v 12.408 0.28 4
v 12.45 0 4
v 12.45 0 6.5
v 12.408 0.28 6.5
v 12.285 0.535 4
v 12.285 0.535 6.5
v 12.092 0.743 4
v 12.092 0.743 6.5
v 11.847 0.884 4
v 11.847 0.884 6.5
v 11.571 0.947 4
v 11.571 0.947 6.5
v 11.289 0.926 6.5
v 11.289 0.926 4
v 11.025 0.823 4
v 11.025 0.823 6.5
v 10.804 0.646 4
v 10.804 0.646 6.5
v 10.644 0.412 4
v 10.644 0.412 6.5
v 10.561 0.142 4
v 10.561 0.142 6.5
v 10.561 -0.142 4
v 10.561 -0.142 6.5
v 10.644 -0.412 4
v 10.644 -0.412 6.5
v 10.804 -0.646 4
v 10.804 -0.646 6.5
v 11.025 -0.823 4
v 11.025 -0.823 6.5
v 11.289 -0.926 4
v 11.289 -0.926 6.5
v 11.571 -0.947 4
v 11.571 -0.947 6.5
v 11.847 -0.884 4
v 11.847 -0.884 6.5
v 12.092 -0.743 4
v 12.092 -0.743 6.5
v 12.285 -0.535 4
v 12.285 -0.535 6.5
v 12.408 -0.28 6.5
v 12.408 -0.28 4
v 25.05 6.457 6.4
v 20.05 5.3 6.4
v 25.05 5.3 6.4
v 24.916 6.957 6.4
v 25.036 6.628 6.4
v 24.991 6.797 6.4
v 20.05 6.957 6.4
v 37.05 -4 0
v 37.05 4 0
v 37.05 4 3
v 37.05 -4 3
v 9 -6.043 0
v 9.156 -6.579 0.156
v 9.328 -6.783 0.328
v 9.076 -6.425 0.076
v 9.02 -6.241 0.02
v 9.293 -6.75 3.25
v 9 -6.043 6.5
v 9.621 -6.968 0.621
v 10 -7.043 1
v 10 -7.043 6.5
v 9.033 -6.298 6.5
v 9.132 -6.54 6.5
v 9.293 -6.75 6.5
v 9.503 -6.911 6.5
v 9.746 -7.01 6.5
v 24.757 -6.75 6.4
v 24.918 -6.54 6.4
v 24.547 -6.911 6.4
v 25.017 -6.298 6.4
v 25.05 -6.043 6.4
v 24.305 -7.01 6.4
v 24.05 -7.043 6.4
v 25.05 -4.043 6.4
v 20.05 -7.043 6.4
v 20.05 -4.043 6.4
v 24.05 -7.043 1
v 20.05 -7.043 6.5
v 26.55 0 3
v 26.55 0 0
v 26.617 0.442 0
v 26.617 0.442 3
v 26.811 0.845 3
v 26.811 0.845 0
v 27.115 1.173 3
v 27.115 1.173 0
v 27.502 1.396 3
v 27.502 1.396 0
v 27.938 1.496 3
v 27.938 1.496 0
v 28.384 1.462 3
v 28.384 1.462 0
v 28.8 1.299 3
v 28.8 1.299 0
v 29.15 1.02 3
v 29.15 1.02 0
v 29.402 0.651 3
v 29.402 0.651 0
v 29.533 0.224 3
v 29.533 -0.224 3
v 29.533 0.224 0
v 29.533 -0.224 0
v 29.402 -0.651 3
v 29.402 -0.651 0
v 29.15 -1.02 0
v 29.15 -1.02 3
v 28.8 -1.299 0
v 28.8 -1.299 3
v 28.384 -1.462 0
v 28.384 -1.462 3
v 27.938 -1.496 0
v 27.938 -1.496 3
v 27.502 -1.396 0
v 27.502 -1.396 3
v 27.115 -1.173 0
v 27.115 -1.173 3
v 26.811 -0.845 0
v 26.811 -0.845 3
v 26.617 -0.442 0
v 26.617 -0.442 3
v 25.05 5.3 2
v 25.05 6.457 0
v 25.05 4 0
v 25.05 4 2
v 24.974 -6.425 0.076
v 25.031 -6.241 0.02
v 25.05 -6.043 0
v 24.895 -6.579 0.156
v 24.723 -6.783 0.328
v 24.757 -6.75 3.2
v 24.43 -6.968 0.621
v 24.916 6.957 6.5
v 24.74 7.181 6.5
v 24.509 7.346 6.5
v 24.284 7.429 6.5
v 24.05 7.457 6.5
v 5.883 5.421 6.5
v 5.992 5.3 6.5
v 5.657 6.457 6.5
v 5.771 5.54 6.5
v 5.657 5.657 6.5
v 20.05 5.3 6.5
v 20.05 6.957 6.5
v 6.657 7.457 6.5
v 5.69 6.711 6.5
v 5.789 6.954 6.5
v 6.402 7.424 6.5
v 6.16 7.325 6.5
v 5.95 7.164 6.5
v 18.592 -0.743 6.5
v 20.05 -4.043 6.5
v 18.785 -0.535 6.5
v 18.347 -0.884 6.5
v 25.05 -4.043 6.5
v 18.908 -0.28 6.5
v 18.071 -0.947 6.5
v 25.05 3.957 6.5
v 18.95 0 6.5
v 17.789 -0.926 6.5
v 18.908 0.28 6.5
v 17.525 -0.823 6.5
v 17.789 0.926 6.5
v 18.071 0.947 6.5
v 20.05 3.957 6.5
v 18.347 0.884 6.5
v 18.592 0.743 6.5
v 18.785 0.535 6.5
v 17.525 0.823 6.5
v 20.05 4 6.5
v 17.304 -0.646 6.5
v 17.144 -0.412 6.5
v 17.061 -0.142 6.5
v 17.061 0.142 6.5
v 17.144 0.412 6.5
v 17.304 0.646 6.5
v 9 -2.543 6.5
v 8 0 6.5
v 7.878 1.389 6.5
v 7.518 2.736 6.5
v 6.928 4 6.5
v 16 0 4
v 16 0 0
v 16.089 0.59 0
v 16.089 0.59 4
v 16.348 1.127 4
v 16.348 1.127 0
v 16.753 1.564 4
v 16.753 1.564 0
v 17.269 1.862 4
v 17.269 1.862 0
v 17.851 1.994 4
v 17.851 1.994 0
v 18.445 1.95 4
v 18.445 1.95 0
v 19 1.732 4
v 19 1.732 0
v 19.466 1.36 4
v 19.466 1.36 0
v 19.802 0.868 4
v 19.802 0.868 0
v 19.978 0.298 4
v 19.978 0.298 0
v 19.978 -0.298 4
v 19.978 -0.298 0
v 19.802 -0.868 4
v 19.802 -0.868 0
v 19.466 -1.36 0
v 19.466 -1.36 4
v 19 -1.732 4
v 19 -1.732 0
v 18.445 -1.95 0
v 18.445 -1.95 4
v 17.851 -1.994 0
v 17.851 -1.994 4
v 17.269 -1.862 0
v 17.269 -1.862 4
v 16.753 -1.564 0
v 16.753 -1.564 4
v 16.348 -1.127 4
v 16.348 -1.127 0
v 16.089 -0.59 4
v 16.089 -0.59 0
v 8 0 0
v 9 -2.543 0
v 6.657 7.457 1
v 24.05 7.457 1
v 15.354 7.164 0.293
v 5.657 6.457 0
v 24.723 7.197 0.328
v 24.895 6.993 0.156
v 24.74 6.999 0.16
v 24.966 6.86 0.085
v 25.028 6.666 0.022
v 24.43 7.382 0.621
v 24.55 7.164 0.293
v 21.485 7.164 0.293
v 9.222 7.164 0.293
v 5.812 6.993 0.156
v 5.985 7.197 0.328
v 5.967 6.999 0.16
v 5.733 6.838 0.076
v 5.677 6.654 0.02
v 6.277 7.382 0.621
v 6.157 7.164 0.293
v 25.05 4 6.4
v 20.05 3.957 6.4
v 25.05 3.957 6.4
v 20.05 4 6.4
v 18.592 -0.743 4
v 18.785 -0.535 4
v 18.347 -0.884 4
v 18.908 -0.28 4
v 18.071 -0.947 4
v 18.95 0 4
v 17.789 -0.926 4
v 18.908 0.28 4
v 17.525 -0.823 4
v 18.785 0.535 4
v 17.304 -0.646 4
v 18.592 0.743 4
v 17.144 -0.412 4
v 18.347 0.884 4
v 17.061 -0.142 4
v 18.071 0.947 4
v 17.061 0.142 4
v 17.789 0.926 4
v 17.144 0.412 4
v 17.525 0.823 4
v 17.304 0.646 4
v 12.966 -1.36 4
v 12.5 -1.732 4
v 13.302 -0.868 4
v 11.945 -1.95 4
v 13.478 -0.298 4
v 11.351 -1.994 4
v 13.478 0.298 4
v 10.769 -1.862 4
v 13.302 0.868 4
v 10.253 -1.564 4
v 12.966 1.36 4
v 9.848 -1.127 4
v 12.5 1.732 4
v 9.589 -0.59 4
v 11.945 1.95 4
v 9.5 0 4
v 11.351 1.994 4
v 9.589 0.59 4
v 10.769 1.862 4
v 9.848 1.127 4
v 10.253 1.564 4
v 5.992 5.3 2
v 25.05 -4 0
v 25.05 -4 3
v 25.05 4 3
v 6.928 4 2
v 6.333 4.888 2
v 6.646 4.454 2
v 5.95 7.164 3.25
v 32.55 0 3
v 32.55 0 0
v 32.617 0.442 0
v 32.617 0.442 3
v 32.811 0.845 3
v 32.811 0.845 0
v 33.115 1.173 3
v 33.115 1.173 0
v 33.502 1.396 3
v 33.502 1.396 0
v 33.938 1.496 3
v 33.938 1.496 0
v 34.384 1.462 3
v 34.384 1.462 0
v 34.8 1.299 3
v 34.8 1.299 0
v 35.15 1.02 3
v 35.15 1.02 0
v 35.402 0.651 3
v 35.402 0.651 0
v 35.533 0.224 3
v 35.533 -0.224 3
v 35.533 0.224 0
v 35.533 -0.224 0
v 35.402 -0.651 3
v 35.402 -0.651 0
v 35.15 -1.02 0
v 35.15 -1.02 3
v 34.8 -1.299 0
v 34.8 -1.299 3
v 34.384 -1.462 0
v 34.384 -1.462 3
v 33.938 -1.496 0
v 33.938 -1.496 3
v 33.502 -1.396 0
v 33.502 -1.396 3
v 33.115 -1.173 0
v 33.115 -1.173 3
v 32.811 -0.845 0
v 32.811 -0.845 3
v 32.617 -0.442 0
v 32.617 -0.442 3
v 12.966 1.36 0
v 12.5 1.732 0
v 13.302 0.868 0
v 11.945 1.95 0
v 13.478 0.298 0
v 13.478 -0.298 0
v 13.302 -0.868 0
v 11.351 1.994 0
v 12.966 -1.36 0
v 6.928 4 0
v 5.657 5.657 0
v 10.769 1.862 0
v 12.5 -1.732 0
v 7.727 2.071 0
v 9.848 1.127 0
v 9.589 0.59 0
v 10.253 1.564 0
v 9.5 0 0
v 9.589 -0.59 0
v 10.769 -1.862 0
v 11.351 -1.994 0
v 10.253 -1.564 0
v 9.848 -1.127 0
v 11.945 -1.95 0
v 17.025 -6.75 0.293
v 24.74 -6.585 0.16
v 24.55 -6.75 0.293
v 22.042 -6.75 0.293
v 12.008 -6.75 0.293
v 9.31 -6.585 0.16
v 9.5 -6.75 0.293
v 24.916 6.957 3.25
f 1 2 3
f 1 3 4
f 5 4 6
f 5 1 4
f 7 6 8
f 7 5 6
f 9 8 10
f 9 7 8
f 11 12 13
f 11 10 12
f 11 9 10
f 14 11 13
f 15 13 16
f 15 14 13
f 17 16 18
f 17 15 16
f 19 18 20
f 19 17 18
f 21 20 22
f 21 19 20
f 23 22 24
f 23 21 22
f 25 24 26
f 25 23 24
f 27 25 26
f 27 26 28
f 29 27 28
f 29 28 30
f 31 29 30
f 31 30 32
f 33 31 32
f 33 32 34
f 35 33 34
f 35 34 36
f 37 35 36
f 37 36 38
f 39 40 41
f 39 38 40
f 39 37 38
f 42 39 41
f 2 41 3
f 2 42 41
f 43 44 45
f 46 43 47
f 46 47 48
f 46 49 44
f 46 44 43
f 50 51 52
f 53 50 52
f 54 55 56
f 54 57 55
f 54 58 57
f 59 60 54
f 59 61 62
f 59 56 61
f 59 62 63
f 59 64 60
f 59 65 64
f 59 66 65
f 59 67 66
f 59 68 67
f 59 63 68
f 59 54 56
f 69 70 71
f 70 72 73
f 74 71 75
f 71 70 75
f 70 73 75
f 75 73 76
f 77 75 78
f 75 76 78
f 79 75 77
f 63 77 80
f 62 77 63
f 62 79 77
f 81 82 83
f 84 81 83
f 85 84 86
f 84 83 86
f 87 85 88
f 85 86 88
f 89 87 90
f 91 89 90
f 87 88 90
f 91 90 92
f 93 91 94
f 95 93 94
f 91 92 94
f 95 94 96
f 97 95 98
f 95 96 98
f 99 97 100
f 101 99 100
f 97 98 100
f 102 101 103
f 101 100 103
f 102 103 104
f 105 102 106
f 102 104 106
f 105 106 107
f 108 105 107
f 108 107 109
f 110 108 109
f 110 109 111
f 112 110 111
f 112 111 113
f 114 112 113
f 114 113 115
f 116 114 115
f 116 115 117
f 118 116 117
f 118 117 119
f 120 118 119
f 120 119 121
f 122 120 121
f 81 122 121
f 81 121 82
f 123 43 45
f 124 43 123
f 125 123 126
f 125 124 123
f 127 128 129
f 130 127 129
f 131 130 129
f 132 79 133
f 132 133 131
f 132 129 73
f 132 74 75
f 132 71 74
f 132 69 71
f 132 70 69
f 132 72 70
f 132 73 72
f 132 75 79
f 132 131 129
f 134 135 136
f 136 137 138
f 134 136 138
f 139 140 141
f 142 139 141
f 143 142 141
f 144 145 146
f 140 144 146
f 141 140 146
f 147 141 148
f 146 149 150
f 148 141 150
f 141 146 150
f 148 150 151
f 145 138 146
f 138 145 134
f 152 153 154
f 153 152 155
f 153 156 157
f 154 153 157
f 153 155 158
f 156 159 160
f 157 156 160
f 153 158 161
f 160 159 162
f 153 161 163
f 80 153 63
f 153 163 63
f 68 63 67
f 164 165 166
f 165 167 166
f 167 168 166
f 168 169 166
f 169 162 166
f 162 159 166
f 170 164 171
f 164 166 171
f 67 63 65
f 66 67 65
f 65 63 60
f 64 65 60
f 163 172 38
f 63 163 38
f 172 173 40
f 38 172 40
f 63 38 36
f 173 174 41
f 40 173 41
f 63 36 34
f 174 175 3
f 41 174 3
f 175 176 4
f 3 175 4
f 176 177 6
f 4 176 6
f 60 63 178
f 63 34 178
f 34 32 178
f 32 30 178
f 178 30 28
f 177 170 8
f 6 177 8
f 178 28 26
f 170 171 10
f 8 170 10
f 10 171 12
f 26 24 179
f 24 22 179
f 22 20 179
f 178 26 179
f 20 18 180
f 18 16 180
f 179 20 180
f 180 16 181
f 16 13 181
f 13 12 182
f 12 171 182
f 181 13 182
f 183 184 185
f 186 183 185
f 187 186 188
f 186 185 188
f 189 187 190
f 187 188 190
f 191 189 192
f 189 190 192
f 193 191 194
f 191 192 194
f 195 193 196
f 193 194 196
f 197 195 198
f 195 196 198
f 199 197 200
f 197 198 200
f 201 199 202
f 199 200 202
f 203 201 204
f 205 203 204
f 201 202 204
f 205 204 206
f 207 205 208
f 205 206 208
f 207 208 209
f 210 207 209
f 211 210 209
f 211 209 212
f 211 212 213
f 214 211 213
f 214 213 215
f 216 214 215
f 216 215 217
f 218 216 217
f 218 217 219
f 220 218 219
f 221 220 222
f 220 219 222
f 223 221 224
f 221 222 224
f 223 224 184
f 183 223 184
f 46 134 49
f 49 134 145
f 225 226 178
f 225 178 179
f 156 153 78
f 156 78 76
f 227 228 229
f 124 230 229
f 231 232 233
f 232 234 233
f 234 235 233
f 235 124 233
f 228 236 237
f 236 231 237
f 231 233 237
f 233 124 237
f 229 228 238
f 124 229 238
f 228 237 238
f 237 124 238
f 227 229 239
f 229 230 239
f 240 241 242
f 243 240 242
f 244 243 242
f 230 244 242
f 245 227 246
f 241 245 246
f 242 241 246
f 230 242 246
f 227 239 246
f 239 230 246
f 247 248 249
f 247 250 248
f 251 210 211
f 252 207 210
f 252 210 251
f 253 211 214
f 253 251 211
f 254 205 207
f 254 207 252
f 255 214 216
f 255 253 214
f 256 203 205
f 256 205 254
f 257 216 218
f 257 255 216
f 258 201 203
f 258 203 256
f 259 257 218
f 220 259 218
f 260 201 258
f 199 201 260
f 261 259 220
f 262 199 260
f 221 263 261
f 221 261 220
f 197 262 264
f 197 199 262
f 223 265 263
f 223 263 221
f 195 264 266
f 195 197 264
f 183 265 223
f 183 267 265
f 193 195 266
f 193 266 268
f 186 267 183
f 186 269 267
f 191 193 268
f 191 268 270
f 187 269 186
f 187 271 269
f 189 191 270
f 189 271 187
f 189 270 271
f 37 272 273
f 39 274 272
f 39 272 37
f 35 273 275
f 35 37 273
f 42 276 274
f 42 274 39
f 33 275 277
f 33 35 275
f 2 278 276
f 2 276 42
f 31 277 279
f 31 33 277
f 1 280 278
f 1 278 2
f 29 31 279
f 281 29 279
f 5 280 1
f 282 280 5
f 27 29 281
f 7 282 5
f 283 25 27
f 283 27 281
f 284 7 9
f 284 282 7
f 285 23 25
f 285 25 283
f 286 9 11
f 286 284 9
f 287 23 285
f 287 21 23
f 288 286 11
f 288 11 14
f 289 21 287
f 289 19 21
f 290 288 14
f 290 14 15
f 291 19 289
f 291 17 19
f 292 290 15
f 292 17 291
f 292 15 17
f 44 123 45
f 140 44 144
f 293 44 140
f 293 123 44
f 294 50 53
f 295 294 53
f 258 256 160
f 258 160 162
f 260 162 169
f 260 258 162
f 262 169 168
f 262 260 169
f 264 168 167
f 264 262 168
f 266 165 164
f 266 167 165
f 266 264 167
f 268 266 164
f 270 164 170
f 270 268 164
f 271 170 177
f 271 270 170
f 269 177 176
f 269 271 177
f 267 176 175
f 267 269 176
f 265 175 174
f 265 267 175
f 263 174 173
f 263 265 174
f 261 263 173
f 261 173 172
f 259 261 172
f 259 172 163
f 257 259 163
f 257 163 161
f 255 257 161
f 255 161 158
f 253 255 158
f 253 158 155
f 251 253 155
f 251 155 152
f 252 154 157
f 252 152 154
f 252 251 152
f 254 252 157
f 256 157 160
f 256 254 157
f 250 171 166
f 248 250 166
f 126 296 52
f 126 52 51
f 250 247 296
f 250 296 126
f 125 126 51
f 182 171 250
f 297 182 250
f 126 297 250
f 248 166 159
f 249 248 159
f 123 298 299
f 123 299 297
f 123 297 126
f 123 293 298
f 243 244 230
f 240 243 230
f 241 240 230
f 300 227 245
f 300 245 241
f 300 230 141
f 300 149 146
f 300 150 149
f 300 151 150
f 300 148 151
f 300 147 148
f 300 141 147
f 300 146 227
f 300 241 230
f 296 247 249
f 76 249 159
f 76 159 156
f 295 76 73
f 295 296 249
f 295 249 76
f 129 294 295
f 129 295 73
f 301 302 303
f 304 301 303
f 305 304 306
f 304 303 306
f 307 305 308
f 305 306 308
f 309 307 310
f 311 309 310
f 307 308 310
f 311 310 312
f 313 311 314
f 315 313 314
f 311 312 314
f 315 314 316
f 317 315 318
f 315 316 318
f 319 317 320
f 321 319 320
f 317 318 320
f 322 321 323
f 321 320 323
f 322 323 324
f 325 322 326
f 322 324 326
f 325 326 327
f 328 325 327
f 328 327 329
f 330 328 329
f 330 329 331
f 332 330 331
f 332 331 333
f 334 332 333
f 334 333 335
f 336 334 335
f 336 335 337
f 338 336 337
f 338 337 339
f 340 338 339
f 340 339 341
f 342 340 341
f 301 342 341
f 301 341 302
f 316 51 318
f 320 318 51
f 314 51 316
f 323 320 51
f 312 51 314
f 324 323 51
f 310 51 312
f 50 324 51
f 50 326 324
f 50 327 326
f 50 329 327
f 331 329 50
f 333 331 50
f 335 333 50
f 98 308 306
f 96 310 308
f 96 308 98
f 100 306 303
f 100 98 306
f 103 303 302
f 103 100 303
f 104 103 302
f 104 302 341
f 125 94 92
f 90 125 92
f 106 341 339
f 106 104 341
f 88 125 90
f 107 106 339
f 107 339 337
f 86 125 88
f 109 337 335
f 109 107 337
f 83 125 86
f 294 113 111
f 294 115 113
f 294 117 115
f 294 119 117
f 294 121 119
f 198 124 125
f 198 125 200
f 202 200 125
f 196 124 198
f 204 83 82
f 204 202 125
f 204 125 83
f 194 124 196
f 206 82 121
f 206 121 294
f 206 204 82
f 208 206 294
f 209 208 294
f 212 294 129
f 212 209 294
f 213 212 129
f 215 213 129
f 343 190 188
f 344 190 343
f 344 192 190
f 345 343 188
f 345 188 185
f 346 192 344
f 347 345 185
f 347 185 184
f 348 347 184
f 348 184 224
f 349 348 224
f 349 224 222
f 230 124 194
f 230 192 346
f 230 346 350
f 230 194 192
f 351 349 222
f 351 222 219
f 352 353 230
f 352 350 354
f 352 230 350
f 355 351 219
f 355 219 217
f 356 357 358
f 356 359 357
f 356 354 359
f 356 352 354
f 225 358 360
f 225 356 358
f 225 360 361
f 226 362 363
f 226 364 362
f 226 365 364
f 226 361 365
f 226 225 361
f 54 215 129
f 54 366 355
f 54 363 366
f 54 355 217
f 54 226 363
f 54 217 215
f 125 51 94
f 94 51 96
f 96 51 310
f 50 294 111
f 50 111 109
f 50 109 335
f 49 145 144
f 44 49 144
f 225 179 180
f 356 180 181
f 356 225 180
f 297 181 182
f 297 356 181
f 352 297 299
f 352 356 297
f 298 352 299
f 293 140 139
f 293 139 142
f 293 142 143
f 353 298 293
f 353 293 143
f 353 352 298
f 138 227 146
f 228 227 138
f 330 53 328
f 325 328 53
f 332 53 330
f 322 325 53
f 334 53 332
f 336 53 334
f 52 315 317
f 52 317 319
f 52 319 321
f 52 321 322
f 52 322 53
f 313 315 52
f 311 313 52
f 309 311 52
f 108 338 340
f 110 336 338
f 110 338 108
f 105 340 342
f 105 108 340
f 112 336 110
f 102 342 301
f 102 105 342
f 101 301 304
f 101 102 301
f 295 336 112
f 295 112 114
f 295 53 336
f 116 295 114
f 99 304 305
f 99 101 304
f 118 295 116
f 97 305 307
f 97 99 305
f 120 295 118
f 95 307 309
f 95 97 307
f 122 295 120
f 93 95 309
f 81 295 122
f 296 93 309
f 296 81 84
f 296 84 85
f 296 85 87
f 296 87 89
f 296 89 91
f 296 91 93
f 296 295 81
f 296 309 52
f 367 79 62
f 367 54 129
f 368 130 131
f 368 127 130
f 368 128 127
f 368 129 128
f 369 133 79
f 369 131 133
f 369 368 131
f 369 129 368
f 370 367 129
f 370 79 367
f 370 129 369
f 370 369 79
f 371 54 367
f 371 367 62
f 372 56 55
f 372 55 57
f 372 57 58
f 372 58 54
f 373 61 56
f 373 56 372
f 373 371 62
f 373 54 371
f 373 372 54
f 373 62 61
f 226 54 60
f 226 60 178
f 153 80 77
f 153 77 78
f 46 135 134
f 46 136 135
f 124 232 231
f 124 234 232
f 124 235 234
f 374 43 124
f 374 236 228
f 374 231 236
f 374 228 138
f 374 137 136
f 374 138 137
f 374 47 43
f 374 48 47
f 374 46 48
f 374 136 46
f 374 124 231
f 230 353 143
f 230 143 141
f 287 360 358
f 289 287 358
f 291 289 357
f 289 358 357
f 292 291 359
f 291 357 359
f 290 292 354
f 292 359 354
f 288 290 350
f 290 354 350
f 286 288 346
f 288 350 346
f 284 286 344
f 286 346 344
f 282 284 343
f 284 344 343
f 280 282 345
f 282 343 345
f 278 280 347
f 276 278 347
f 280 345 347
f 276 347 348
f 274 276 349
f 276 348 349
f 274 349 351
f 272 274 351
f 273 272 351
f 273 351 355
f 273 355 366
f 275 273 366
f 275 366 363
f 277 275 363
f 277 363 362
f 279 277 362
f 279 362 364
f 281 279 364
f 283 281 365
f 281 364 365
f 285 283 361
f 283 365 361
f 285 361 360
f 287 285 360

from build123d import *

# Parameters (mm, degrees)
BOSS_EXTRUDE1_DEPTH      = 2
BOSS_EXTRUDE6_DEPTH      = 4.5
CUT_EXTRUDE6_DEPTH       = 4.5
BOSS_EXTRUDE14_DEPTH     = 2.3
SKETCH32_R               = 3
CUT_EXTRUDE7_DEPTH       = 2.3
SKETCH33_W               = 12.393398282201806
SKETCH33_H               = 2.000000000000001
BOSS_EXTRUDE15_DEPTH     = 1.2
CUT_EXTRUDE8_DEPTH       = 2.4
SKETCH43_R               = 2.5000000000000004
SKETCH43_R_2             = 2.4999999999999982
BOSS_EXTRUDE17_DEPTH     = 1.2
CUT_EXTRUDE11_DEPTH      = 29.420773915365164
CUT_EXTRUDE11_DEPTH_BACK = 29.420773915365164
SKETCH44_R               = 0.9499999999999992
SKETCH44_R_2             = 0.9500000000000008
SKETCH49_R               = 0.7500000000000021
CUT_EXTRUDE13_DEPTH      = 3
FILLET1_R                = 1.5
FILLET3_START            = -1
FILLET3_DEPTH            = 8
FILLET3_START_2          = 5
FILLET3_2_DEPTH          = 21
FILLET3_3_DEPTH          = 8
SKETCH45_R               = 1.9999999999999996
SKETCH45_R_2             = 2.000000000000003
CUT_EXTRUDE15_DEPTH      = 4
FILLET4_R                = 2
BOSS_EXTRUDE18_DEPTH     = 12
SKETCH52_R               = 1.500000000000004
SKETCH52_R_2             = 1.5000000000000007
CUT_EXTRUDE16_DEPTH      = 12


with BuildPart() as part:
    # Sketch3 → Boss-Extrude1 (new body)
    with BuildSketch(Plane.XY):
        with BuildLine():
            Line((8.000000000000002, 0), (8.999999999999995, -2.5431457505076205))
            Line((8.999999999999995, -2.5431457505076205), (8.999999999999995, -7.043145750507605))
            Line((8.999999999999995, -7.043145750507605), (21.50000000000004, -7.043145750507604))
            Line((21.50000000000004, -7.043145750507604), (25.05025253169418, -7.043145750507604))
            Line((25.05025253169418, -7.043145750507604), (25.050252531694177, 7.456854249492383))
            Line((25.050252531694177, 7.456854249492383), (5.656854249492373, 7.456854249492379))
            Line((5.656854249492373, 7.456854249492379), (5.656854249492376, 5.656854249492382))
            ThreePointArc((5.656854249492376, 5.656854249492382), (7.391036260090296, 3.061467458920721), (8.000000000000002, 0))
        make_face()
    extrude(amount=BOSS_EXTRUDE1_DEPTH)

    # Sketch22 → Boss-Extrude6 (add)
    with BuildSketch(Plane.XY.offset(2)):
        with BuildLine():
            Line((5.656854249492378, 7.456854249492383), (21.500000000000025, 7.456854249492383))
            Line((21.500000000000025, 7.456854249492383), (25.050252531694177, 7.456854249492383))
            Line((25.050252531694177, 7.456854249492383), (25.05025253169418, -7.043145750507604))
            Line((25.05025253169418, -7.043145750507604), (8.999999999999995, -7.043145750507605))
            Line((8.999999999999995, -7.043145750507605), (8.999999999999995, -2.5431457505076205))
            Line((8.999999999999995, -2.5431457505076205), (7.999999999999998, 0))
            ThreePointArc((7.999999999999998, 0), (7.391036260090291, 3.061467458920719), (5.656854249492376, 5.656854249492382))
            Line((5.656854249492376, 5.656854249492382), (5.656854249492378, 7.456854249492383))
        make_face()
    extrude(amount=BOSS_EXTRUDE6_DEPTH)

    # Sketch26 → Cut-Extrude6 (cut)
    with BuildSketch(Plane.XY.offset(2)):
        Polygon((18.098080447707712, 5.299999999999999), (2.5300524575164793, 5.299999999999999), (2.5300524575164793, 4), (18.098080447707712, 4), (25.05025253169419, 4.000000000000001), (25.05025253169419, 5.299999999999999), align=None)
    extrude(amount=CUT_EXTRUDE6_DEPTH, mode=Mode.SUBTRACT)


with BuildPart() as body_2:
    # Sketch31 → Boss-Extrude14 (new body)
    with BuildSketch(Plane.XY.offset(6.5)):
        with BuildLine():
            Line((2.4326880657739025, 5.656854247099344), (0.00016454221484158, 5.656854247099344))
            ThreePointArc((0.00016454221484158, 5.656854247099344), (-5.656854248894122, 8.227110743131e-05), (0, -5.656854249492382))
            Line((0, -5.656854249492382), (9.000000000000004, -5.656854249492382))
            Line((9.000000000000004, -5.656854249492382), (8.999999999999995, -7.043145750507605))
            Line((8.999999999999995, -7.043145750507605), (8.999999999999995, -8.543145750507605))
            Line((8.999999999999995, -8.543145750507605), (21.50000000000004, -8.543145750507605))
            Line((21.50000000000004, -8.543145750507605), (21.50000000000004, -7.043145750507605))
            Line((21.50000000000004, -7.043145750507605), (25.05025253169418, -7.043145750507604))
            Line((25.05025253169418, -7.043145750507604), (25.05025253169418, 8.956854249492379))
            Line((25.05025253169418, 8.956854249492379), (5.656854249492376, 8.956854249492379))
            Line((5.656854249492376, 8.956854249492379), (5.656854249492378, 7.456854249492383))
            Line((5.656854249492378, 7.456854249492383), (5.656854249492376, 5.613708498984764))
            Line((5.656854249492376, 5.613708498984764), (2.4326880657739025, 5.656854247099344))
        make_face()
    extrude(amount=BOSS_EXTRUDE14_DEPTH)

    # Sketch32 → Cut-Extrude7 (cut)
    with BuildSketch(Plane.XY.offset(8.799999999999999)):
        Circle(SKETCH32_R)
    extrude(amount=-CUT_EXTRUDE7_DEPTH, mode=Mode.SUBTRACT)

    # Sketch33 → Boss-Extrude15 (add)
    with BuildSketch(Plane.XY.offset(8.799999999999999)):
        with Locations((11.853553390593277, 7.956854249492379)):
            Rectangle(SKETCH33_W, SKETCH33_H)
        Polygon((9.000000000000004, -7.043145750507606), (9.000000000000004, -8.543145750507605), (18.05025253169418, -8.543145750507605), (18.05025253169418, -7.0431457505076045), align=None)
        with BuildLine():
            Line((7.000000000000003, -4.156854249492383), (18.05025253169419, -4.156854249492383))
            Line((18.05025253169419, -4.156854249492383), (18.05025253169419, -2.1568542494923824))
            Line((18.05025253169419, -2.1568542494923824), (7.000000000000003, -2.1568542494923832))
            ThreePointArc((7.000000000000003, -2.1568542494923832), (6.000000000000003, -3.1568542494923832), (7.000000000000003, -4.156854249492383))
        make_face()
        with BuildLine():
            Line((18.05025253169419, 2.172006245196199), (7.000000000000003, 2.172006245196201))
            ThreePointArc((7.000000000000003, 2.172006245196201), (6.0000000000000036, 3.1720062451962), (7.000000000000003, 4.172006245196199))
            Line((7.000000000000003, 4.172006245196199), (18.05025253169419, 4.172006245196199))
            Line((18.05025253169419, 4.172006245196199), (18.05025253169419, 2.172006245196199))
        make_face()
    extrude(amount=BOSS_EXTRUDE15_DEPTH)


with BuildPart() as cut_extrude8_tool:
    # Sketch35 → Cut-Extrude8 (new body)
    with BuildSketch(Plane.XY.offset(8.799999999999999)):
        Polygon((25.05025253169418, 3.956854249492379), (25.05025253169418, 6.9568542494923795), (20.05025253169418, 6.956854249492378), (20.05025253169418, 3.9568542494923773), align=None)
        Polygon((25.05025253169418, -7.043145750507604), (20.05025253169419, -7.0431457505076045), (20.05025253169419, -4.043145750507604), (25.05025253169418, -4.043145750507604), align=None)
    extrude(amount=-CUT_EXTRUDE8_DEPTH)


with BuildPart() as part_1:
    add(part.part)

    # Cut-Extrude8: cut by cut_extrude8_tool
    add(cut_extrude8_tool.part, mode=Mode.SUBTRACT)


with BuildPart() as body_2_1:
    add(body_2.part)

    # Cut-Extrude8: cut by cut_extrude8_tool
    add(cut_extrude8_tool.part, mode=Mode.SUBTRACT)

    # Sketch43 → Boss-Extrude17 (add)
    with BuildSketch(Plane.XY.offset(8.799999999999999)):
        with Locations((11.500000000000004, 0)):
            Circle(SKETCH43_R)
        with Locations((18.000000000000004, 0)):
            Circle(SKETCH43_R_2)
    extrude(amount=BOSS_EXTRUDE17_DEPTH)


with BuildPart() as cut_extrude11_tool:
    # Sketch44 → Cut-Extrude11 (new, two sides: drawn at the far end of the back side and taken through both)
    with BuildSketch(Plane.XY.offset(9.999999999999998).offset(-CUT_EXTRUDE11_DEPTH_BACK)):
        with Locations((11.500000000000004, 0)):
            Circle(SKETCH44_R)
        with Locations((18.000000000000004, 0)):
            Circle(SKETCH44_R_2)
    extrude(amount=CUT_EXTRUDE11_DEPTH + CUT_EXTRUDE11_DEPTH_BACK)


with BuildPart() as part_2:
    add(part_1.part)

    # Cut-Extrude11: cut by cut_extrude11_tool
    add(cut_extrude11_tool.part, mode=Mode.SUBTRACT)

    # Fillet3: read off the stored shape, not the designer's step
    # Fillet3 outline → Fillet3 (cut)
    with BuildSketch(Plane.XY.offset(FILLET3_START)):
        with BuildLine():
            Line((9, -7.043145751), (10, -7.043145751))
            add(Edge.make_bspline(
                [(10, -7.043145751), (8.99999999999999, -7.043145750507609), (9, -6.043145751)],
                knots=[0, 0, 0, 1, 1, 1], degree=2, weights=[1, 0.7071067811865481, 1]))
            Line((9, -6.043145751), (9, -7.043145751))
        make_face()
        with BuildLine():
            Line((5.656854249, 7.456854249), (5.656854249, 6.456854249))
            add(Edge.make_bspline(
                [(5.656854249, 6.456854249), (5.656854249492369, 7.4568542494923795), (6.656854249, 7.456854249)],
                knots=[0, 0, 0, 1, 1, 1], degree=2, weights=[1, 0.707106781186547, 1]))
            Line((6.656854249, 7.456854249), (5.656854249, 7.456854249))
        make_face()
    extrude(amount=FILLET3_DEPTH, mode=Mode.SUBTRACT)

    # Fillet3 2 outline → Fillet3 2 (cut)
    with BuildSketch(Plane.YZ.offset(FILLET3_START_2)):
        with BuildLine():
            Line((-7.043145751, 0), (-6.043145751, 0))
            add(Edge.make_bspline(
                [(-6.043145751, 0), (-7.0431457505076045, 0), (-7.043145751, 1)],
                knots=[0, 0, 0, 1, 1, 1], degree=2, weights=[1, 0.707106781186548, 1]))
            Line((-7.043145751, 1), (-7.043145751, 0))
        make_face()
        with BuildLine():
            add(Edge.make_bspline(
                [(6.456854249, 0), (7.456854249492381, 0), (7.456854249, 1)],
                knots=[0, 0, 0, 1, 1, 1], degree=2, weights=[1, 0.707106781186548, 1]))
            Line((6.456854249, 0), (7.456854249, 0))
            Line((7.456854249, 0), (7.456854249, 1))
        make_face()
    extrude(amount=FILLET3_2_DEPTH, mode=Mode.SUBTRACT)

    # Fillet3 3 outline → Fillet3 3 (cut)
    with BuildSketch(Plane.XY.offset(FILLET3_START)):
        with BuildLine():
            Line((25.050252532, -7.043145751), (25.050252532, -6.043145751))
            add(Edge.make_bspline(
                [(25.050252532, -6.043145751), (25.050252531694195, -7.0431457505076045), (24.050252532, -7.043145751)],
                knots=[0, 0, 0, 1, 1, 1], degree=2, weights=[1, 0.707106781186548, 1]))
            Line((24.050252532, -7.043145751), (25.050252532, -7.043145751))
        make_face()
        with BuildLine():
            Line((25.050252532, 6.456854249), (25.050252532, 7.456854249))
            Line((25.050252532, 7.456854249), (24.050252532, 7.456854249))
            add(Edge.make_bspline(
                [(24.050252532, 7.456854249), (24.23662286224227, 7.456854249492371), (24.442904569552457, 7.413222711328381), (24.646119560607424, 7.308816022097408), (24.808964717093836, 7.142726196138974), (24.971827345010716, 6.860639849810825), (25.01301948040526, 6.758429238057051), (25.038618001980854, 6.6546327736033515), (25.050252531694174, 6.553326631418876), (25.050252532, 6.456854249)],
                knots=[0, 0, 0, 0, 0, 0, 0.6589186227127712, 0.6589186227127712, 0.6589186227127712, 0.6589186227127712, 1.0000000000000395, 1.0000000000000395, 1.0000000000000395, 1.0000000000000395, 1.0000000000000395, 1.0000000000000395], degree=5, weights=[1, 1.0000000000000024, 0.9950915544751191, 0.9930584097693568, 0.9999999999999981, 1.0000000000000009, 0.9997935626898684, 0.9999244387002607, 0.9999999999999992, 1]))
        make_face()
    extrude(amount=FILLET3_3_DEPTH, mode=Mode.SUBTRACT)

    # Sketch45 → Cut-Extrude15 (cut)
    with BuildSketch(Plane(origin=(0, 0, 0), x_dir=(-1, 0, 0), z_dir=(0, 0, -1))):
        with Locations((-11.500000000000004, 0)):
            Circle(SKETCH45_R)
        with Locations((-18.000000000000004, 0)):
            Circle(SKETCH45_R_2)
    extrude(amount=-CUT_EXTRUDE15_DEPTH, mode=Mode.SUBTRACT)

    # Sketch51 → Boss-Extrude18 (add)
    with BuildSketch(Plane(origin=(25.05025253169418, 5.99e-15, 0), x_dir=(0, 0, -1), z_dir=(1, 2.4e-16, 0))):
        Polygon((-9.5e-16, 3.9999999999999947), (3e-17, -4.000000000000005), (-3, -4.000000000000005), (-3.000000000000001, 3.9999999999999942), align=None)
    extrude(amount=BOSS_EXTRUDE18_DEPTH)

    # Sketch52 → Cut-Extrude16 (cut)
    with BuildSketch(Plane(origin=(0, 0, 0), x_dir=(-1, 0, 0), z_dir=(0, 0, -1))):
        with Locations((-34.05025253169418, 3.47e-15)):
            Circle(SKETCH52_R)
        with Locations((-28.05025253169418, 3.9e-15)):
            Circle(SKETCH52_R_2)
    extrude(amount=-CUT_EXTRUDE16_DEPTH, mode=Mode.SUBTRACT)


with BuildPart() as body_2_2:
    add(body_2_1.part)

    # Cut-Extrude11: cut by cut_extrude11_tool
    add(cut_extrude11_tool.part, mode=Mode.SUBTRACT)

    # Sketch49 → Cut-Extrude13 (cut, along a direction that is not the sketch's normal)
    with BuildSketch(Plane.XZ.offset(-6.956854249492379)):
        with Locations((16.05025253169419, 9.999999999999998)):
            Circle(SKETCH49_R)
    extrude(amount=-CUT_EXTRUDE13_DEPTH, dir=(0.6858421465414155, -0.7277503349552398, 0), mode=Mode.SUBTRACT)

    # Fillet1
    fillet1_edges = [body_2_2.edges().sort_by_distance(p)[0] for p in [
        (15.353553390593278, 8.956854249492379, 6.5),
        (15.250000000000018, -8.543145750507605, 6.5),
    ]]
    fillet(fillet1_edges, radius=FILLET1_R)

    # Fillet4
    fillet4_edges = [body_2_2.edges().sort_by_distance(p)[0] for p in [
        (20.05025253169418, 5.456854249492378, 8.799999999999999),
        (20.05025253169419, -5.543145750507604, 8.799999999999999),
    ]]
    fillet(fillet4_edges, radius=FILLET4_R - 0.0001)  # a hair under: the kernel refuses the full size


solid = part_2.part
